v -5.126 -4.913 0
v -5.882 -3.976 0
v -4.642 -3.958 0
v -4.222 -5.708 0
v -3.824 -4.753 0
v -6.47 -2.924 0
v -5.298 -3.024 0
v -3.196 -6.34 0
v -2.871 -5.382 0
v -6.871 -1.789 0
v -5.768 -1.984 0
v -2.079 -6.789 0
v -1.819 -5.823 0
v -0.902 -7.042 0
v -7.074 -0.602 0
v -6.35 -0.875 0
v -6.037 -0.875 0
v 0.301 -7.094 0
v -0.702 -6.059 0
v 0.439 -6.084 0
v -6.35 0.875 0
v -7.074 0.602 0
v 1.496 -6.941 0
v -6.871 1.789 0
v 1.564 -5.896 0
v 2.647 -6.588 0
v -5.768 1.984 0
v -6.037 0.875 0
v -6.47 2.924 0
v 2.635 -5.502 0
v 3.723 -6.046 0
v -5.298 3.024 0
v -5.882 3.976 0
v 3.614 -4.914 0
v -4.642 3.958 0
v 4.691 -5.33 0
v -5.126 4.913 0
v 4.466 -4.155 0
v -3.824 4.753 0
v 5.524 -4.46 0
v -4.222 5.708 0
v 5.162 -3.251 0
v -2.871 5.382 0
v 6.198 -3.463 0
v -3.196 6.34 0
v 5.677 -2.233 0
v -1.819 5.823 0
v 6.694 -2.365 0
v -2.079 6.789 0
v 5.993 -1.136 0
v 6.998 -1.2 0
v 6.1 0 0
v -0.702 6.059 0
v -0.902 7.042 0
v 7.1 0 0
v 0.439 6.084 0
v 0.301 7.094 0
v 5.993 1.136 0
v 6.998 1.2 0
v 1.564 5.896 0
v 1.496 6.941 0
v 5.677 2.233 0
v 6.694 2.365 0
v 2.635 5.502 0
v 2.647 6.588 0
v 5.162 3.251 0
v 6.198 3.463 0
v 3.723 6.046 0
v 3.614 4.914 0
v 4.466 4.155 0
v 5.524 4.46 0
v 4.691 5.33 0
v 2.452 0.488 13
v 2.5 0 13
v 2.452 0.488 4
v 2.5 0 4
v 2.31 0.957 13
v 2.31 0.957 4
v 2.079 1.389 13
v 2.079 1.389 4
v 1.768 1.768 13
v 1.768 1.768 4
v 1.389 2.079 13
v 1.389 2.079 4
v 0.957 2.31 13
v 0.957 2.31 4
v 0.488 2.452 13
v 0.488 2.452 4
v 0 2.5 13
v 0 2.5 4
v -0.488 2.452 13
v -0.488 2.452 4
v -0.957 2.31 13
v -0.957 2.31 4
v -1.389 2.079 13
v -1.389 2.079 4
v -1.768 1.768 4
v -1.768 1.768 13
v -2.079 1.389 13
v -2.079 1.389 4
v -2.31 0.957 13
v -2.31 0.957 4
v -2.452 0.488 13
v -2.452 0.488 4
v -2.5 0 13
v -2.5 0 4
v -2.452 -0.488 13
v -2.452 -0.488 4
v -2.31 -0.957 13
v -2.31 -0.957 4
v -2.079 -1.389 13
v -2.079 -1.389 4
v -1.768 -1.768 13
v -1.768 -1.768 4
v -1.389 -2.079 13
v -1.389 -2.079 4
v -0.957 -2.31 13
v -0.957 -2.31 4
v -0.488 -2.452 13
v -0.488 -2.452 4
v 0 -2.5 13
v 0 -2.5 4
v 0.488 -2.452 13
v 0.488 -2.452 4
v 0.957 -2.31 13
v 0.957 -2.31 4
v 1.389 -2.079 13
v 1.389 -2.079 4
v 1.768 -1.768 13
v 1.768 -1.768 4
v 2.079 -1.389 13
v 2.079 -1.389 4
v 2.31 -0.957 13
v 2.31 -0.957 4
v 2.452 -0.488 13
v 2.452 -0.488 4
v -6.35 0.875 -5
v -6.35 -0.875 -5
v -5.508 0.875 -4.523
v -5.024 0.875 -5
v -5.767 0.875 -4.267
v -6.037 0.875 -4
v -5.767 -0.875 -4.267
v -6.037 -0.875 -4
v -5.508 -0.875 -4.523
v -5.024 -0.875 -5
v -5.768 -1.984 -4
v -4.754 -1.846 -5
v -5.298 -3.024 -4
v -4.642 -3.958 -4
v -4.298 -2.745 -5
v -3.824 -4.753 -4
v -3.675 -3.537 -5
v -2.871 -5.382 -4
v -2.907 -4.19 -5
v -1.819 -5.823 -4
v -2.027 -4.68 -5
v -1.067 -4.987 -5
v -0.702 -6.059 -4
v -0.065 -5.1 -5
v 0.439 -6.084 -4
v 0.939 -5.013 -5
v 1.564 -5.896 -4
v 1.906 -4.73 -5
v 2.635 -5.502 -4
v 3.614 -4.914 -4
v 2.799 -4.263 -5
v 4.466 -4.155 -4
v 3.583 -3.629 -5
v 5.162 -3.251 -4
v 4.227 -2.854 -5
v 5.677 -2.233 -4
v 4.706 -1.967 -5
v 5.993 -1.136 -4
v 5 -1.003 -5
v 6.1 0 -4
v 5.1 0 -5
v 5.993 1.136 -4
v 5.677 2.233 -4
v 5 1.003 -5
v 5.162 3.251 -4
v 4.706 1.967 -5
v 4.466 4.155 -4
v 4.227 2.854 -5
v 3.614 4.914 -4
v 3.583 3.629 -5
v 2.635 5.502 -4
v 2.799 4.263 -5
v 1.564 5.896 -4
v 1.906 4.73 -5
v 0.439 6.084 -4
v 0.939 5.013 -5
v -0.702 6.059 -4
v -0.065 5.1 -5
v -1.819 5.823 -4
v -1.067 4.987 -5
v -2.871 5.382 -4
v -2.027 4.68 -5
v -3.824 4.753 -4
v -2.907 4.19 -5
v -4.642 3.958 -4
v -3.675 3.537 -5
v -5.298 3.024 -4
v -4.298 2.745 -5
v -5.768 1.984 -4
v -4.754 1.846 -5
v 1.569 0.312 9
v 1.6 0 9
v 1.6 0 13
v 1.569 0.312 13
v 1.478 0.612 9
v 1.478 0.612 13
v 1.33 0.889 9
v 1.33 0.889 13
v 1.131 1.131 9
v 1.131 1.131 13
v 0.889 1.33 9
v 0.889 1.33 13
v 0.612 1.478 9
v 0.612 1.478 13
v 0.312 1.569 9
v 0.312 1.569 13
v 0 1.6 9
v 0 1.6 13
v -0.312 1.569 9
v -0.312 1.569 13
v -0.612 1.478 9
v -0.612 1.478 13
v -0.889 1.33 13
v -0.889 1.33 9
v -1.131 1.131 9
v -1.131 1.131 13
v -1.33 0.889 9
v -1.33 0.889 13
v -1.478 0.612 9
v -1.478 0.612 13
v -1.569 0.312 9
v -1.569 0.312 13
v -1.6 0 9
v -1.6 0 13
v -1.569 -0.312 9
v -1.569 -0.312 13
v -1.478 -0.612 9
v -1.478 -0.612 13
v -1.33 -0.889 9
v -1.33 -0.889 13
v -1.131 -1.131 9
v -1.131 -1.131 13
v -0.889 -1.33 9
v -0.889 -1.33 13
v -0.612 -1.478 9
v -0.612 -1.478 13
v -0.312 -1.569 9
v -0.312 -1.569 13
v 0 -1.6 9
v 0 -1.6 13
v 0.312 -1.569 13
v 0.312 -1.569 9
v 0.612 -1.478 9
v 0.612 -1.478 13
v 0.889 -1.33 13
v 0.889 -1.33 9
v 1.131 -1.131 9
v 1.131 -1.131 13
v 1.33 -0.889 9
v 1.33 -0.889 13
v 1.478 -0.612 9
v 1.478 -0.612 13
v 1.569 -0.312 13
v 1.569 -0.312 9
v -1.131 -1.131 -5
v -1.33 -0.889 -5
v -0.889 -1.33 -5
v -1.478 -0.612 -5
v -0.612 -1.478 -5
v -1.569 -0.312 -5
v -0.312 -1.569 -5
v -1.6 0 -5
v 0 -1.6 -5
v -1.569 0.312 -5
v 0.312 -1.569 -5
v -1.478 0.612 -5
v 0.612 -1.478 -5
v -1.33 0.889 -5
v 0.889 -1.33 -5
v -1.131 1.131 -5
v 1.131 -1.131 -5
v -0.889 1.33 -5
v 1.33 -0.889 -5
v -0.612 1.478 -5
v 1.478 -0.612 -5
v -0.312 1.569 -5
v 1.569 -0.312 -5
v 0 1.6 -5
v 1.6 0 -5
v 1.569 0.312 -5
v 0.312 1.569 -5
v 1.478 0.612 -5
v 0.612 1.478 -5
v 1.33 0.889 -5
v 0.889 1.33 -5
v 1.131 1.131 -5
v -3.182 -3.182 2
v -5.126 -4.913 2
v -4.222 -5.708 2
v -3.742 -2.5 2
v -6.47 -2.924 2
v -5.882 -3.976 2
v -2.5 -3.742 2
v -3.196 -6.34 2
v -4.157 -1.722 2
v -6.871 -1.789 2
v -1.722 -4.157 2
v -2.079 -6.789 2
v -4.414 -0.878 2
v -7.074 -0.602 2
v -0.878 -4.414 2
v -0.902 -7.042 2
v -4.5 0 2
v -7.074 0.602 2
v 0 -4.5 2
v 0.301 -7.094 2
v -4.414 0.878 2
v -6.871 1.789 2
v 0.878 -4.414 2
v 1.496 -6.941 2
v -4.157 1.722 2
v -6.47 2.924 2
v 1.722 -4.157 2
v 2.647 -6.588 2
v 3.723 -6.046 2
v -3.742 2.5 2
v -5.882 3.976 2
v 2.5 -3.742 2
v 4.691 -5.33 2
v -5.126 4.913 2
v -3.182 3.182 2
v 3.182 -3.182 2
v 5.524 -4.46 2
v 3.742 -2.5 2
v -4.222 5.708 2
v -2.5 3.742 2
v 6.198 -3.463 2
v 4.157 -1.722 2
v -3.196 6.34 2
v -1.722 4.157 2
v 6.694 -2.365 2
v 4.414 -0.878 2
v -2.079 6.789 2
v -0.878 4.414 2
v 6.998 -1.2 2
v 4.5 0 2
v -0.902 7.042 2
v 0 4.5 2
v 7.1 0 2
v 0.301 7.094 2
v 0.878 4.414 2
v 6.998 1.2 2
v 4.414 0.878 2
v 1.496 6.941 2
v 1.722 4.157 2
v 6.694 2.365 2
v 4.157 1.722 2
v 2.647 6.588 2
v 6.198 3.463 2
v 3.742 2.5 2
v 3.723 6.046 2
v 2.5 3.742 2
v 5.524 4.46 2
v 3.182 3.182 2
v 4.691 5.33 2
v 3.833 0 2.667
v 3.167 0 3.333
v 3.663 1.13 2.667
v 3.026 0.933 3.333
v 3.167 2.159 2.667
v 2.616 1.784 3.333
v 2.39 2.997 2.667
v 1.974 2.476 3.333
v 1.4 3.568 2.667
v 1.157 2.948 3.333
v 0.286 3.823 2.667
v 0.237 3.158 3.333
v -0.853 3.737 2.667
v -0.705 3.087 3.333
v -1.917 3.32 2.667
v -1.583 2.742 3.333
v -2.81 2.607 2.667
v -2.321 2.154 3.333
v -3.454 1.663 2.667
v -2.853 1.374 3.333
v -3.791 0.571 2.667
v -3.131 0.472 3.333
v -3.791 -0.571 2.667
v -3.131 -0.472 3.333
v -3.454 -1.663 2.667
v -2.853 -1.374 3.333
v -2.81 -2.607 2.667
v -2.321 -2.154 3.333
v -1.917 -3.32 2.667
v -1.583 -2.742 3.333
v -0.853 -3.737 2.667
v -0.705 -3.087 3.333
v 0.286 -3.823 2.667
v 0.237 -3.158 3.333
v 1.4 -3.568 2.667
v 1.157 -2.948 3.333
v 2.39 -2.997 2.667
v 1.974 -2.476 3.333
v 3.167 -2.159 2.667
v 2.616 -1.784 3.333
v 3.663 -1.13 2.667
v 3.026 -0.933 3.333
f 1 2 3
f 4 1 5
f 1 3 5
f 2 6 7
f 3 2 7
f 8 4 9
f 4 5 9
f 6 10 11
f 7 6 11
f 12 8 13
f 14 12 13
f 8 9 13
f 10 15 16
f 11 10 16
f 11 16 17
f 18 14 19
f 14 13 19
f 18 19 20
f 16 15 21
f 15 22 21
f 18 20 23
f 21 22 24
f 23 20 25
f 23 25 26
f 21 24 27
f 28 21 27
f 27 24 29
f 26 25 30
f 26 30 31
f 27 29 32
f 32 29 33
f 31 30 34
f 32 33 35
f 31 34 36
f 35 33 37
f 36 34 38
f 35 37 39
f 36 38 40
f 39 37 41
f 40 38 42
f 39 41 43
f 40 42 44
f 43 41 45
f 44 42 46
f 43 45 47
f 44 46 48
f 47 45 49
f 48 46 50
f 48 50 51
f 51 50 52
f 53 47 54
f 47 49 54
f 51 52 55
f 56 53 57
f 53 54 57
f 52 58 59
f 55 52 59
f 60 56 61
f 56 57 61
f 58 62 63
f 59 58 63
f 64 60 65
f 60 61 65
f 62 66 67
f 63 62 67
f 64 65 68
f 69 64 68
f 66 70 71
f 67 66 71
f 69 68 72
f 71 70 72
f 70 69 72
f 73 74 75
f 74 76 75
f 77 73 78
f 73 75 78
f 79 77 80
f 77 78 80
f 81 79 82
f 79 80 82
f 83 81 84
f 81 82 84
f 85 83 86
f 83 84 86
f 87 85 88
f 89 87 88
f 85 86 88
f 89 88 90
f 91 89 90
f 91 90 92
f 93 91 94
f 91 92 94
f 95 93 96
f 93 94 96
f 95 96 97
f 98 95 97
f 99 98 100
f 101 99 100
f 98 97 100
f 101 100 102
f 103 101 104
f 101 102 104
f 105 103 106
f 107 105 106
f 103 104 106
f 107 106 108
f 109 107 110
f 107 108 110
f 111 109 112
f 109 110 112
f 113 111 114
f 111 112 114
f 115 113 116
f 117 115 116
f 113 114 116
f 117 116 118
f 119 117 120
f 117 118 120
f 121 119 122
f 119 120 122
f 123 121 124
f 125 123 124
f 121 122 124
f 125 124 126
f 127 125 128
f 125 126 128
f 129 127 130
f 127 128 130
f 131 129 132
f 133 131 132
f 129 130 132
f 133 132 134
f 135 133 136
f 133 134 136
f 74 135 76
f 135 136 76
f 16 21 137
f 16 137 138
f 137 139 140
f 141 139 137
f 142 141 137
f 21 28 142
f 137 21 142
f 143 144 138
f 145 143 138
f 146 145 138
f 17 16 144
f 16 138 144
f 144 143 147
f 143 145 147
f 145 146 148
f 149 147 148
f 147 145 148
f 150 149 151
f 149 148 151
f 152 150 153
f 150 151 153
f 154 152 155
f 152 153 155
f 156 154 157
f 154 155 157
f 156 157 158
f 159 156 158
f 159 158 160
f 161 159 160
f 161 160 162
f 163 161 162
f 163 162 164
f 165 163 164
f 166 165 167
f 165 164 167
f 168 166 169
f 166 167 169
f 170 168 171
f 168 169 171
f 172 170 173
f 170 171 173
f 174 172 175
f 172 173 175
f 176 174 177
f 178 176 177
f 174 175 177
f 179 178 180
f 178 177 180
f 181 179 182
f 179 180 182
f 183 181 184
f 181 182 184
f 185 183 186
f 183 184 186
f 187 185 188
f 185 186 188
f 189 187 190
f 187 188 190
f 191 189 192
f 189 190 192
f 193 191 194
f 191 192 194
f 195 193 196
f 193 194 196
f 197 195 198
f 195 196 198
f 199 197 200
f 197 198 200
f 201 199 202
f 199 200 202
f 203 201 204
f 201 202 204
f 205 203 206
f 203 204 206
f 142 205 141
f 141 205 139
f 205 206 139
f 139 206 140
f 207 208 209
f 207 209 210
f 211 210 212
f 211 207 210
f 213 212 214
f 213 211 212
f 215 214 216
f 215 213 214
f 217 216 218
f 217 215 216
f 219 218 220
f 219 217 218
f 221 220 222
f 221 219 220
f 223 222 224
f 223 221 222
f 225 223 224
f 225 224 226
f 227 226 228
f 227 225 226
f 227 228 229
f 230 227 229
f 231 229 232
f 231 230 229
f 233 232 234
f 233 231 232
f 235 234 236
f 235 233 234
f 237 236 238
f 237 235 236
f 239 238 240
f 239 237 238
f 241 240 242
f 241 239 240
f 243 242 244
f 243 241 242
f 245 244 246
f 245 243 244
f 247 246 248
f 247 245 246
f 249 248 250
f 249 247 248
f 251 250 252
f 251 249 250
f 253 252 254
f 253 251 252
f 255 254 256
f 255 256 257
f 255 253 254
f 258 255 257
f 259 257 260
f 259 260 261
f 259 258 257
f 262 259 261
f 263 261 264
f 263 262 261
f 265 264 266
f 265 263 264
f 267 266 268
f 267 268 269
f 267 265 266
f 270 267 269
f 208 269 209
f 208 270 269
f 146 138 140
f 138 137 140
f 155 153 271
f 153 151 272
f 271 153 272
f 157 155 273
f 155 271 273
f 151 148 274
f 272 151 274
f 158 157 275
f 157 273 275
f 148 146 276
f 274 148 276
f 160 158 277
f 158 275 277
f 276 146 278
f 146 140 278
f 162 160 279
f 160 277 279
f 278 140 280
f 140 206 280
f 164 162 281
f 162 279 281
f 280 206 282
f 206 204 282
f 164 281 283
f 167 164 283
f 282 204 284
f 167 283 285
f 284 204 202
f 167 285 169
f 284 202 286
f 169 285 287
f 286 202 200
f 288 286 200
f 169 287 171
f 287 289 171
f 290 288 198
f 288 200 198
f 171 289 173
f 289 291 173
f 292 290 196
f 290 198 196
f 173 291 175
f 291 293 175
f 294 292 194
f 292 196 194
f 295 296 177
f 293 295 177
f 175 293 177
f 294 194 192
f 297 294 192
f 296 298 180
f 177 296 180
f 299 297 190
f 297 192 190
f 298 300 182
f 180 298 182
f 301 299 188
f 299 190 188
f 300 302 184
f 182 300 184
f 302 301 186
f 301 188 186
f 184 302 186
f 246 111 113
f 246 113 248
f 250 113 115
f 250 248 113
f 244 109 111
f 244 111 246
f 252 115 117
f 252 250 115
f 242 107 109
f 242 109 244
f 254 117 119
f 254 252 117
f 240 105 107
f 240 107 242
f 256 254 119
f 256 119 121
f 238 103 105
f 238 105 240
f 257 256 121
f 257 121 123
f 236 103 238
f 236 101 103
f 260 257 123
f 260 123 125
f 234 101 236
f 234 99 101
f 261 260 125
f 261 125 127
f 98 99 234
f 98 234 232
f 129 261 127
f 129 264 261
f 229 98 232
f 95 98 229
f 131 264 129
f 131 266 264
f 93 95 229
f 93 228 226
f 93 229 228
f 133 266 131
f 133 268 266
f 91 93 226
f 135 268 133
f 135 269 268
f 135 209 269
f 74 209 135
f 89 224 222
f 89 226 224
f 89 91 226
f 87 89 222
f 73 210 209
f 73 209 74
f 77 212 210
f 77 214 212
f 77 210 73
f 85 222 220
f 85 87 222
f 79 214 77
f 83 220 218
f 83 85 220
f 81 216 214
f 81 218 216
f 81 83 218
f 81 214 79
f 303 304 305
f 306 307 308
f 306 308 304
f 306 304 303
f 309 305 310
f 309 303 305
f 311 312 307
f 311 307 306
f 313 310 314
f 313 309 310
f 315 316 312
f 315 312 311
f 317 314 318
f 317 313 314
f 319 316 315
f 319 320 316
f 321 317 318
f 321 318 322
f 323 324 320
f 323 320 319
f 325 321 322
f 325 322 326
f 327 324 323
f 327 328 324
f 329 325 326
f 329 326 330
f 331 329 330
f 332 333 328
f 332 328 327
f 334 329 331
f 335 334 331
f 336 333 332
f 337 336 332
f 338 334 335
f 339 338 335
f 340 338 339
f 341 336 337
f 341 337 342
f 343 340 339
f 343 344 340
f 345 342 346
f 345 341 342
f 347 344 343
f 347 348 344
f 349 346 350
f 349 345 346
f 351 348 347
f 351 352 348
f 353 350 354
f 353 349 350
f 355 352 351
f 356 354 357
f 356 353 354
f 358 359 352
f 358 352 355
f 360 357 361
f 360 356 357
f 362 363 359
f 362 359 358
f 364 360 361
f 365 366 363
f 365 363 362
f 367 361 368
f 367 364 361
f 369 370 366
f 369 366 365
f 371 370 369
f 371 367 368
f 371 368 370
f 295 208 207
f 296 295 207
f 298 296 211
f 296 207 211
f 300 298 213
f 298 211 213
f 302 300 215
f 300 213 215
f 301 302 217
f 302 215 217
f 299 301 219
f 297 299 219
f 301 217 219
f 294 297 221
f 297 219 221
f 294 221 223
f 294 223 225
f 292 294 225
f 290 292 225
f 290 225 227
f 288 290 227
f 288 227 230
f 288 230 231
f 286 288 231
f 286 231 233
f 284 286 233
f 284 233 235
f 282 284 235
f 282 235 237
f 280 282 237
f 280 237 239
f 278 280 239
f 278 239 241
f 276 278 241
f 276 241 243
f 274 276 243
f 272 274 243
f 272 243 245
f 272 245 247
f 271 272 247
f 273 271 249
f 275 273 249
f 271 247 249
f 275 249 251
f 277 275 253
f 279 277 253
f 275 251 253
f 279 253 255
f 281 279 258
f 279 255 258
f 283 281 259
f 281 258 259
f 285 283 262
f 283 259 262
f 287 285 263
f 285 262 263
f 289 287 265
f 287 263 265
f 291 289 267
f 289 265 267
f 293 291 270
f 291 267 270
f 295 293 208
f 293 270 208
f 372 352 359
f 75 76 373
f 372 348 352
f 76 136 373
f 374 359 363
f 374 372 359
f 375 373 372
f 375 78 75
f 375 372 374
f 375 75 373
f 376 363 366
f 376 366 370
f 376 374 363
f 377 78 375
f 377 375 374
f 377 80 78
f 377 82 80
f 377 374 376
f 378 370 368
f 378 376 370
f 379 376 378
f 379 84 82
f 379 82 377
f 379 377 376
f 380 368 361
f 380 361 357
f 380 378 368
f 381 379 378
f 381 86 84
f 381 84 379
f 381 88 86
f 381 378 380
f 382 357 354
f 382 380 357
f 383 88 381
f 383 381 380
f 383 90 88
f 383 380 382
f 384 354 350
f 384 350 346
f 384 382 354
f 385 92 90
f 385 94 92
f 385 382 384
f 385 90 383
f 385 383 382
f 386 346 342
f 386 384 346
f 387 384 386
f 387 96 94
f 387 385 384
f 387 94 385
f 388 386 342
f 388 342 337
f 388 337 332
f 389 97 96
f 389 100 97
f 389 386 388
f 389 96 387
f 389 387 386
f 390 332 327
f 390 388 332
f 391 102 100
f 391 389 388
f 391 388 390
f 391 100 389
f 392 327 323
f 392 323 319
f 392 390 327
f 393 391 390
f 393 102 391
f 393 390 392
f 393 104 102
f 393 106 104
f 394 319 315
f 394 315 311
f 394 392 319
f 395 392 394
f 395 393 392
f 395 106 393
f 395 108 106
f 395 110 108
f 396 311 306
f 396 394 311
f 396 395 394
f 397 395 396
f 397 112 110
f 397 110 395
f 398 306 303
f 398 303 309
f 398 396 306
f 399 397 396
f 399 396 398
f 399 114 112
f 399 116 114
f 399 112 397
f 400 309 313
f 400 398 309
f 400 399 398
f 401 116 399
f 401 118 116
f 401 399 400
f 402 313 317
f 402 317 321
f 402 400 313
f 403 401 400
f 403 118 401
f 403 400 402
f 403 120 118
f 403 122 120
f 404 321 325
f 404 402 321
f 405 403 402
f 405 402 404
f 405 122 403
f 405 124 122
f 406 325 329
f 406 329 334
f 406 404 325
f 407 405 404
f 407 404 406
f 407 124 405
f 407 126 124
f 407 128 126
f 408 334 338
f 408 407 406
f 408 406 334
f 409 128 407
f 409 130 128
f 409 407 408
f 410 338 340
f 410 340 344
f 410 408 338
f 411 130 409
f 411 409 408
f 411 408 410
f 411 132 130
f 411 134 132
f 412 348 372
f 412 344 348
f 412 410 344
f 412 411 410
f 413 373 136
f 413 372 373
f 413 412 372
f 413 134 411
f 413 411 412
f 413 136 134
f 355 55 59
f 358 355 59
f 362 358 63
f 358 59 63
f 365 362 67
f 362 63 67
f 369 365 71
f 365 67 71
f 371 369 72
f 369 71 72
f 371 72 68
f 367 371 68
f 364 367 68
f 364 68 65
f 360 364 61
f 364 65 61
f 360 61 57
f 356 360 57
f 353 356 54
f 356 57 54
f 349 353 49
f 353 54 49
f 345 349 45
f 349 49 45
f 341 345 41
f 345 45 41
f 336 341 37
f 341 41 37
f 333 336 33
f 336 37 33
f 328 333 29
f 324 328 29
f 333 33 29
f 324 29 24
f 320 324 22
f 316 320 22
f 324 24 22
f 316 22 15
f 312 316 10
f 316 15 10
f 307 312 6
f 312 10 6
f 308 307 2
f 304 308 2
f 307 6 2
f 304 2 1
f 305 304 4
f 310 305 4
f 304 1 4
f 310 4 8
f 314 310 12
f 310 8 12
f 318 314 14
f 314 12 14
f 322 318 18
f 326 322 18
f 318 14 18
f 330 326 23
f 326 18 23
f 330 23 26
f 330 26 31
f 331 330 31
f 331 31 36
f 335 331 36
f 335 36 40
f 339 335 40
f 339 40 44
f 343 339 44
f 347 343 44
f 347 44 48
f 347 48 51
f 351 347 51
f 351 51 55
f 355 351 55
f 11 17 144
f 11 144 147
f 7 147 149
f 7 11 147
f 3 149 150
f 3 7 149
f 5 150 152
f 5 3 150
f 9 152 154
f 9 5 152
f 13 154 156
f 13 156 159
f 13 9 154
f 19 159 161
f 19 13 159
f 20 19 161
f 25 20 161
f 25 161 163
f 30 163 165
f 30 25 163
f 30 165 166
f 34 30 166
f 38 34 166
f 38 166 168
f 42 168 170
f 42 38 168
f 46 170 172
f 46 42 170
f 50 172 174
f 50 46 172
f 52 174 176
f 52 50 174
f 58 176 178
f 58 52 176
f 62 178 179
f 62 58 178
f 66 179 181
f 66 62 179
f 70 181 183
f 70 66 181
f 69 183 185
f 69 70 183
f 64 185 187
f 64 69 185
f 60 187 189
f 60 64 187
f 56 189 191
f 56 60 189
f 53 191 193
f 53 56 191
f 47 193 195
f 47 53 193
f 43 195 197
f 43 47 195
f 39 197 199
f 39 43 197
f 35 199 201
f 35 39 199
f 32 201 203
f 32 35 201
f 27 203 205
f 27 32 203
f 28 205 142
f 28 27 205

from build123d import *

# Parameters (mm, degrees)
EXTRUDE_1_DEPTH     = 5
SKETCH_2_R          = 7.1
EXTRUDE_2_DEPTH     = 2
SKETCH_3_R          = 2.5
EXTRUDE_3_DEPTH     = 7
CHAMFER_1_SIZE      = 2
SKETCH_4_R          = 1.6
CUT_EXTRUDE_1_DEPTH = 30
CHAMFER_2_SIZE      = 1
MOVE_FACE_1_BY      = 4


with BuildPart() as part:
    # ｽｹｯﾁ1 → ﾎﾞｽ - 押し出し1 (new body)
    with BuildSketch(Plane.XY):
        with BuildLine():
            Line((-6.35, -0.875), (-6.036917674, -0.875))
            ThreePointArc((-6.036917674, -0.875), (6.1, 0), (-6.036917674, 0.875))
            Line((-6.036917674, 0.875), (-6.35, 0.875))
            Line((-6.35, 0.875), (-6.35, -0.875))
        make_face()
    extrude(amount=-EXTRUDE_1_DEPTH)

    # ｽｹｯﾁ2 → ﾎﾞｽ - 押し出し2 (add)
    with BuildSketch(Plane.XY):
        Circle(SKETCH_2_R)
    extrude(amount=EXTRUDE_2_DEPTH)

    # ｽｹｯﾁ3 → ﾎﾞｽ - 押し出し3 (add)
    with BuildSketch(Plane.XY.offset(2)):
        Circle(SKETCH_3_R)
    extrude(amount=EXTRUDE_3_DEPTH)

    # 面取り1
    chamfer_1_edges = [part.edges().sort_by_distance(p)[0] for p in [
        (-2.5, 0, 2),
    ]]
    chamfer(chamfer_1_edges, length=CHAMFER_1_SIZE)

    # ｽｹｯﾁ4 → ｶｯﾄ - 押し出し1 (cut)
    with BuildSketch(Plane.XY.offset(9)):
        Circle(SKETCH_4_R)
    extrude(amount=-CUT_EXTRUDE_1_DEPTH, mode=Mode.SUBTRACT)

    # 面取り2
    chamfer_2_edges = [part.edges().sort_by_distance(p)[0] for p in [
        (6.1, 0, -5),
    ]]
    chamfer(chamfer_2_edges, length=CHAMFER_2_SIZE)

    # Move Face 1: a face moved outward by 4.0
    extrude(part.faces().sort_by_distance((0, -2, 9))[0], amount=MOVE_FACE_1_BY, dir=(0, 0, 1))


solid = part.part
